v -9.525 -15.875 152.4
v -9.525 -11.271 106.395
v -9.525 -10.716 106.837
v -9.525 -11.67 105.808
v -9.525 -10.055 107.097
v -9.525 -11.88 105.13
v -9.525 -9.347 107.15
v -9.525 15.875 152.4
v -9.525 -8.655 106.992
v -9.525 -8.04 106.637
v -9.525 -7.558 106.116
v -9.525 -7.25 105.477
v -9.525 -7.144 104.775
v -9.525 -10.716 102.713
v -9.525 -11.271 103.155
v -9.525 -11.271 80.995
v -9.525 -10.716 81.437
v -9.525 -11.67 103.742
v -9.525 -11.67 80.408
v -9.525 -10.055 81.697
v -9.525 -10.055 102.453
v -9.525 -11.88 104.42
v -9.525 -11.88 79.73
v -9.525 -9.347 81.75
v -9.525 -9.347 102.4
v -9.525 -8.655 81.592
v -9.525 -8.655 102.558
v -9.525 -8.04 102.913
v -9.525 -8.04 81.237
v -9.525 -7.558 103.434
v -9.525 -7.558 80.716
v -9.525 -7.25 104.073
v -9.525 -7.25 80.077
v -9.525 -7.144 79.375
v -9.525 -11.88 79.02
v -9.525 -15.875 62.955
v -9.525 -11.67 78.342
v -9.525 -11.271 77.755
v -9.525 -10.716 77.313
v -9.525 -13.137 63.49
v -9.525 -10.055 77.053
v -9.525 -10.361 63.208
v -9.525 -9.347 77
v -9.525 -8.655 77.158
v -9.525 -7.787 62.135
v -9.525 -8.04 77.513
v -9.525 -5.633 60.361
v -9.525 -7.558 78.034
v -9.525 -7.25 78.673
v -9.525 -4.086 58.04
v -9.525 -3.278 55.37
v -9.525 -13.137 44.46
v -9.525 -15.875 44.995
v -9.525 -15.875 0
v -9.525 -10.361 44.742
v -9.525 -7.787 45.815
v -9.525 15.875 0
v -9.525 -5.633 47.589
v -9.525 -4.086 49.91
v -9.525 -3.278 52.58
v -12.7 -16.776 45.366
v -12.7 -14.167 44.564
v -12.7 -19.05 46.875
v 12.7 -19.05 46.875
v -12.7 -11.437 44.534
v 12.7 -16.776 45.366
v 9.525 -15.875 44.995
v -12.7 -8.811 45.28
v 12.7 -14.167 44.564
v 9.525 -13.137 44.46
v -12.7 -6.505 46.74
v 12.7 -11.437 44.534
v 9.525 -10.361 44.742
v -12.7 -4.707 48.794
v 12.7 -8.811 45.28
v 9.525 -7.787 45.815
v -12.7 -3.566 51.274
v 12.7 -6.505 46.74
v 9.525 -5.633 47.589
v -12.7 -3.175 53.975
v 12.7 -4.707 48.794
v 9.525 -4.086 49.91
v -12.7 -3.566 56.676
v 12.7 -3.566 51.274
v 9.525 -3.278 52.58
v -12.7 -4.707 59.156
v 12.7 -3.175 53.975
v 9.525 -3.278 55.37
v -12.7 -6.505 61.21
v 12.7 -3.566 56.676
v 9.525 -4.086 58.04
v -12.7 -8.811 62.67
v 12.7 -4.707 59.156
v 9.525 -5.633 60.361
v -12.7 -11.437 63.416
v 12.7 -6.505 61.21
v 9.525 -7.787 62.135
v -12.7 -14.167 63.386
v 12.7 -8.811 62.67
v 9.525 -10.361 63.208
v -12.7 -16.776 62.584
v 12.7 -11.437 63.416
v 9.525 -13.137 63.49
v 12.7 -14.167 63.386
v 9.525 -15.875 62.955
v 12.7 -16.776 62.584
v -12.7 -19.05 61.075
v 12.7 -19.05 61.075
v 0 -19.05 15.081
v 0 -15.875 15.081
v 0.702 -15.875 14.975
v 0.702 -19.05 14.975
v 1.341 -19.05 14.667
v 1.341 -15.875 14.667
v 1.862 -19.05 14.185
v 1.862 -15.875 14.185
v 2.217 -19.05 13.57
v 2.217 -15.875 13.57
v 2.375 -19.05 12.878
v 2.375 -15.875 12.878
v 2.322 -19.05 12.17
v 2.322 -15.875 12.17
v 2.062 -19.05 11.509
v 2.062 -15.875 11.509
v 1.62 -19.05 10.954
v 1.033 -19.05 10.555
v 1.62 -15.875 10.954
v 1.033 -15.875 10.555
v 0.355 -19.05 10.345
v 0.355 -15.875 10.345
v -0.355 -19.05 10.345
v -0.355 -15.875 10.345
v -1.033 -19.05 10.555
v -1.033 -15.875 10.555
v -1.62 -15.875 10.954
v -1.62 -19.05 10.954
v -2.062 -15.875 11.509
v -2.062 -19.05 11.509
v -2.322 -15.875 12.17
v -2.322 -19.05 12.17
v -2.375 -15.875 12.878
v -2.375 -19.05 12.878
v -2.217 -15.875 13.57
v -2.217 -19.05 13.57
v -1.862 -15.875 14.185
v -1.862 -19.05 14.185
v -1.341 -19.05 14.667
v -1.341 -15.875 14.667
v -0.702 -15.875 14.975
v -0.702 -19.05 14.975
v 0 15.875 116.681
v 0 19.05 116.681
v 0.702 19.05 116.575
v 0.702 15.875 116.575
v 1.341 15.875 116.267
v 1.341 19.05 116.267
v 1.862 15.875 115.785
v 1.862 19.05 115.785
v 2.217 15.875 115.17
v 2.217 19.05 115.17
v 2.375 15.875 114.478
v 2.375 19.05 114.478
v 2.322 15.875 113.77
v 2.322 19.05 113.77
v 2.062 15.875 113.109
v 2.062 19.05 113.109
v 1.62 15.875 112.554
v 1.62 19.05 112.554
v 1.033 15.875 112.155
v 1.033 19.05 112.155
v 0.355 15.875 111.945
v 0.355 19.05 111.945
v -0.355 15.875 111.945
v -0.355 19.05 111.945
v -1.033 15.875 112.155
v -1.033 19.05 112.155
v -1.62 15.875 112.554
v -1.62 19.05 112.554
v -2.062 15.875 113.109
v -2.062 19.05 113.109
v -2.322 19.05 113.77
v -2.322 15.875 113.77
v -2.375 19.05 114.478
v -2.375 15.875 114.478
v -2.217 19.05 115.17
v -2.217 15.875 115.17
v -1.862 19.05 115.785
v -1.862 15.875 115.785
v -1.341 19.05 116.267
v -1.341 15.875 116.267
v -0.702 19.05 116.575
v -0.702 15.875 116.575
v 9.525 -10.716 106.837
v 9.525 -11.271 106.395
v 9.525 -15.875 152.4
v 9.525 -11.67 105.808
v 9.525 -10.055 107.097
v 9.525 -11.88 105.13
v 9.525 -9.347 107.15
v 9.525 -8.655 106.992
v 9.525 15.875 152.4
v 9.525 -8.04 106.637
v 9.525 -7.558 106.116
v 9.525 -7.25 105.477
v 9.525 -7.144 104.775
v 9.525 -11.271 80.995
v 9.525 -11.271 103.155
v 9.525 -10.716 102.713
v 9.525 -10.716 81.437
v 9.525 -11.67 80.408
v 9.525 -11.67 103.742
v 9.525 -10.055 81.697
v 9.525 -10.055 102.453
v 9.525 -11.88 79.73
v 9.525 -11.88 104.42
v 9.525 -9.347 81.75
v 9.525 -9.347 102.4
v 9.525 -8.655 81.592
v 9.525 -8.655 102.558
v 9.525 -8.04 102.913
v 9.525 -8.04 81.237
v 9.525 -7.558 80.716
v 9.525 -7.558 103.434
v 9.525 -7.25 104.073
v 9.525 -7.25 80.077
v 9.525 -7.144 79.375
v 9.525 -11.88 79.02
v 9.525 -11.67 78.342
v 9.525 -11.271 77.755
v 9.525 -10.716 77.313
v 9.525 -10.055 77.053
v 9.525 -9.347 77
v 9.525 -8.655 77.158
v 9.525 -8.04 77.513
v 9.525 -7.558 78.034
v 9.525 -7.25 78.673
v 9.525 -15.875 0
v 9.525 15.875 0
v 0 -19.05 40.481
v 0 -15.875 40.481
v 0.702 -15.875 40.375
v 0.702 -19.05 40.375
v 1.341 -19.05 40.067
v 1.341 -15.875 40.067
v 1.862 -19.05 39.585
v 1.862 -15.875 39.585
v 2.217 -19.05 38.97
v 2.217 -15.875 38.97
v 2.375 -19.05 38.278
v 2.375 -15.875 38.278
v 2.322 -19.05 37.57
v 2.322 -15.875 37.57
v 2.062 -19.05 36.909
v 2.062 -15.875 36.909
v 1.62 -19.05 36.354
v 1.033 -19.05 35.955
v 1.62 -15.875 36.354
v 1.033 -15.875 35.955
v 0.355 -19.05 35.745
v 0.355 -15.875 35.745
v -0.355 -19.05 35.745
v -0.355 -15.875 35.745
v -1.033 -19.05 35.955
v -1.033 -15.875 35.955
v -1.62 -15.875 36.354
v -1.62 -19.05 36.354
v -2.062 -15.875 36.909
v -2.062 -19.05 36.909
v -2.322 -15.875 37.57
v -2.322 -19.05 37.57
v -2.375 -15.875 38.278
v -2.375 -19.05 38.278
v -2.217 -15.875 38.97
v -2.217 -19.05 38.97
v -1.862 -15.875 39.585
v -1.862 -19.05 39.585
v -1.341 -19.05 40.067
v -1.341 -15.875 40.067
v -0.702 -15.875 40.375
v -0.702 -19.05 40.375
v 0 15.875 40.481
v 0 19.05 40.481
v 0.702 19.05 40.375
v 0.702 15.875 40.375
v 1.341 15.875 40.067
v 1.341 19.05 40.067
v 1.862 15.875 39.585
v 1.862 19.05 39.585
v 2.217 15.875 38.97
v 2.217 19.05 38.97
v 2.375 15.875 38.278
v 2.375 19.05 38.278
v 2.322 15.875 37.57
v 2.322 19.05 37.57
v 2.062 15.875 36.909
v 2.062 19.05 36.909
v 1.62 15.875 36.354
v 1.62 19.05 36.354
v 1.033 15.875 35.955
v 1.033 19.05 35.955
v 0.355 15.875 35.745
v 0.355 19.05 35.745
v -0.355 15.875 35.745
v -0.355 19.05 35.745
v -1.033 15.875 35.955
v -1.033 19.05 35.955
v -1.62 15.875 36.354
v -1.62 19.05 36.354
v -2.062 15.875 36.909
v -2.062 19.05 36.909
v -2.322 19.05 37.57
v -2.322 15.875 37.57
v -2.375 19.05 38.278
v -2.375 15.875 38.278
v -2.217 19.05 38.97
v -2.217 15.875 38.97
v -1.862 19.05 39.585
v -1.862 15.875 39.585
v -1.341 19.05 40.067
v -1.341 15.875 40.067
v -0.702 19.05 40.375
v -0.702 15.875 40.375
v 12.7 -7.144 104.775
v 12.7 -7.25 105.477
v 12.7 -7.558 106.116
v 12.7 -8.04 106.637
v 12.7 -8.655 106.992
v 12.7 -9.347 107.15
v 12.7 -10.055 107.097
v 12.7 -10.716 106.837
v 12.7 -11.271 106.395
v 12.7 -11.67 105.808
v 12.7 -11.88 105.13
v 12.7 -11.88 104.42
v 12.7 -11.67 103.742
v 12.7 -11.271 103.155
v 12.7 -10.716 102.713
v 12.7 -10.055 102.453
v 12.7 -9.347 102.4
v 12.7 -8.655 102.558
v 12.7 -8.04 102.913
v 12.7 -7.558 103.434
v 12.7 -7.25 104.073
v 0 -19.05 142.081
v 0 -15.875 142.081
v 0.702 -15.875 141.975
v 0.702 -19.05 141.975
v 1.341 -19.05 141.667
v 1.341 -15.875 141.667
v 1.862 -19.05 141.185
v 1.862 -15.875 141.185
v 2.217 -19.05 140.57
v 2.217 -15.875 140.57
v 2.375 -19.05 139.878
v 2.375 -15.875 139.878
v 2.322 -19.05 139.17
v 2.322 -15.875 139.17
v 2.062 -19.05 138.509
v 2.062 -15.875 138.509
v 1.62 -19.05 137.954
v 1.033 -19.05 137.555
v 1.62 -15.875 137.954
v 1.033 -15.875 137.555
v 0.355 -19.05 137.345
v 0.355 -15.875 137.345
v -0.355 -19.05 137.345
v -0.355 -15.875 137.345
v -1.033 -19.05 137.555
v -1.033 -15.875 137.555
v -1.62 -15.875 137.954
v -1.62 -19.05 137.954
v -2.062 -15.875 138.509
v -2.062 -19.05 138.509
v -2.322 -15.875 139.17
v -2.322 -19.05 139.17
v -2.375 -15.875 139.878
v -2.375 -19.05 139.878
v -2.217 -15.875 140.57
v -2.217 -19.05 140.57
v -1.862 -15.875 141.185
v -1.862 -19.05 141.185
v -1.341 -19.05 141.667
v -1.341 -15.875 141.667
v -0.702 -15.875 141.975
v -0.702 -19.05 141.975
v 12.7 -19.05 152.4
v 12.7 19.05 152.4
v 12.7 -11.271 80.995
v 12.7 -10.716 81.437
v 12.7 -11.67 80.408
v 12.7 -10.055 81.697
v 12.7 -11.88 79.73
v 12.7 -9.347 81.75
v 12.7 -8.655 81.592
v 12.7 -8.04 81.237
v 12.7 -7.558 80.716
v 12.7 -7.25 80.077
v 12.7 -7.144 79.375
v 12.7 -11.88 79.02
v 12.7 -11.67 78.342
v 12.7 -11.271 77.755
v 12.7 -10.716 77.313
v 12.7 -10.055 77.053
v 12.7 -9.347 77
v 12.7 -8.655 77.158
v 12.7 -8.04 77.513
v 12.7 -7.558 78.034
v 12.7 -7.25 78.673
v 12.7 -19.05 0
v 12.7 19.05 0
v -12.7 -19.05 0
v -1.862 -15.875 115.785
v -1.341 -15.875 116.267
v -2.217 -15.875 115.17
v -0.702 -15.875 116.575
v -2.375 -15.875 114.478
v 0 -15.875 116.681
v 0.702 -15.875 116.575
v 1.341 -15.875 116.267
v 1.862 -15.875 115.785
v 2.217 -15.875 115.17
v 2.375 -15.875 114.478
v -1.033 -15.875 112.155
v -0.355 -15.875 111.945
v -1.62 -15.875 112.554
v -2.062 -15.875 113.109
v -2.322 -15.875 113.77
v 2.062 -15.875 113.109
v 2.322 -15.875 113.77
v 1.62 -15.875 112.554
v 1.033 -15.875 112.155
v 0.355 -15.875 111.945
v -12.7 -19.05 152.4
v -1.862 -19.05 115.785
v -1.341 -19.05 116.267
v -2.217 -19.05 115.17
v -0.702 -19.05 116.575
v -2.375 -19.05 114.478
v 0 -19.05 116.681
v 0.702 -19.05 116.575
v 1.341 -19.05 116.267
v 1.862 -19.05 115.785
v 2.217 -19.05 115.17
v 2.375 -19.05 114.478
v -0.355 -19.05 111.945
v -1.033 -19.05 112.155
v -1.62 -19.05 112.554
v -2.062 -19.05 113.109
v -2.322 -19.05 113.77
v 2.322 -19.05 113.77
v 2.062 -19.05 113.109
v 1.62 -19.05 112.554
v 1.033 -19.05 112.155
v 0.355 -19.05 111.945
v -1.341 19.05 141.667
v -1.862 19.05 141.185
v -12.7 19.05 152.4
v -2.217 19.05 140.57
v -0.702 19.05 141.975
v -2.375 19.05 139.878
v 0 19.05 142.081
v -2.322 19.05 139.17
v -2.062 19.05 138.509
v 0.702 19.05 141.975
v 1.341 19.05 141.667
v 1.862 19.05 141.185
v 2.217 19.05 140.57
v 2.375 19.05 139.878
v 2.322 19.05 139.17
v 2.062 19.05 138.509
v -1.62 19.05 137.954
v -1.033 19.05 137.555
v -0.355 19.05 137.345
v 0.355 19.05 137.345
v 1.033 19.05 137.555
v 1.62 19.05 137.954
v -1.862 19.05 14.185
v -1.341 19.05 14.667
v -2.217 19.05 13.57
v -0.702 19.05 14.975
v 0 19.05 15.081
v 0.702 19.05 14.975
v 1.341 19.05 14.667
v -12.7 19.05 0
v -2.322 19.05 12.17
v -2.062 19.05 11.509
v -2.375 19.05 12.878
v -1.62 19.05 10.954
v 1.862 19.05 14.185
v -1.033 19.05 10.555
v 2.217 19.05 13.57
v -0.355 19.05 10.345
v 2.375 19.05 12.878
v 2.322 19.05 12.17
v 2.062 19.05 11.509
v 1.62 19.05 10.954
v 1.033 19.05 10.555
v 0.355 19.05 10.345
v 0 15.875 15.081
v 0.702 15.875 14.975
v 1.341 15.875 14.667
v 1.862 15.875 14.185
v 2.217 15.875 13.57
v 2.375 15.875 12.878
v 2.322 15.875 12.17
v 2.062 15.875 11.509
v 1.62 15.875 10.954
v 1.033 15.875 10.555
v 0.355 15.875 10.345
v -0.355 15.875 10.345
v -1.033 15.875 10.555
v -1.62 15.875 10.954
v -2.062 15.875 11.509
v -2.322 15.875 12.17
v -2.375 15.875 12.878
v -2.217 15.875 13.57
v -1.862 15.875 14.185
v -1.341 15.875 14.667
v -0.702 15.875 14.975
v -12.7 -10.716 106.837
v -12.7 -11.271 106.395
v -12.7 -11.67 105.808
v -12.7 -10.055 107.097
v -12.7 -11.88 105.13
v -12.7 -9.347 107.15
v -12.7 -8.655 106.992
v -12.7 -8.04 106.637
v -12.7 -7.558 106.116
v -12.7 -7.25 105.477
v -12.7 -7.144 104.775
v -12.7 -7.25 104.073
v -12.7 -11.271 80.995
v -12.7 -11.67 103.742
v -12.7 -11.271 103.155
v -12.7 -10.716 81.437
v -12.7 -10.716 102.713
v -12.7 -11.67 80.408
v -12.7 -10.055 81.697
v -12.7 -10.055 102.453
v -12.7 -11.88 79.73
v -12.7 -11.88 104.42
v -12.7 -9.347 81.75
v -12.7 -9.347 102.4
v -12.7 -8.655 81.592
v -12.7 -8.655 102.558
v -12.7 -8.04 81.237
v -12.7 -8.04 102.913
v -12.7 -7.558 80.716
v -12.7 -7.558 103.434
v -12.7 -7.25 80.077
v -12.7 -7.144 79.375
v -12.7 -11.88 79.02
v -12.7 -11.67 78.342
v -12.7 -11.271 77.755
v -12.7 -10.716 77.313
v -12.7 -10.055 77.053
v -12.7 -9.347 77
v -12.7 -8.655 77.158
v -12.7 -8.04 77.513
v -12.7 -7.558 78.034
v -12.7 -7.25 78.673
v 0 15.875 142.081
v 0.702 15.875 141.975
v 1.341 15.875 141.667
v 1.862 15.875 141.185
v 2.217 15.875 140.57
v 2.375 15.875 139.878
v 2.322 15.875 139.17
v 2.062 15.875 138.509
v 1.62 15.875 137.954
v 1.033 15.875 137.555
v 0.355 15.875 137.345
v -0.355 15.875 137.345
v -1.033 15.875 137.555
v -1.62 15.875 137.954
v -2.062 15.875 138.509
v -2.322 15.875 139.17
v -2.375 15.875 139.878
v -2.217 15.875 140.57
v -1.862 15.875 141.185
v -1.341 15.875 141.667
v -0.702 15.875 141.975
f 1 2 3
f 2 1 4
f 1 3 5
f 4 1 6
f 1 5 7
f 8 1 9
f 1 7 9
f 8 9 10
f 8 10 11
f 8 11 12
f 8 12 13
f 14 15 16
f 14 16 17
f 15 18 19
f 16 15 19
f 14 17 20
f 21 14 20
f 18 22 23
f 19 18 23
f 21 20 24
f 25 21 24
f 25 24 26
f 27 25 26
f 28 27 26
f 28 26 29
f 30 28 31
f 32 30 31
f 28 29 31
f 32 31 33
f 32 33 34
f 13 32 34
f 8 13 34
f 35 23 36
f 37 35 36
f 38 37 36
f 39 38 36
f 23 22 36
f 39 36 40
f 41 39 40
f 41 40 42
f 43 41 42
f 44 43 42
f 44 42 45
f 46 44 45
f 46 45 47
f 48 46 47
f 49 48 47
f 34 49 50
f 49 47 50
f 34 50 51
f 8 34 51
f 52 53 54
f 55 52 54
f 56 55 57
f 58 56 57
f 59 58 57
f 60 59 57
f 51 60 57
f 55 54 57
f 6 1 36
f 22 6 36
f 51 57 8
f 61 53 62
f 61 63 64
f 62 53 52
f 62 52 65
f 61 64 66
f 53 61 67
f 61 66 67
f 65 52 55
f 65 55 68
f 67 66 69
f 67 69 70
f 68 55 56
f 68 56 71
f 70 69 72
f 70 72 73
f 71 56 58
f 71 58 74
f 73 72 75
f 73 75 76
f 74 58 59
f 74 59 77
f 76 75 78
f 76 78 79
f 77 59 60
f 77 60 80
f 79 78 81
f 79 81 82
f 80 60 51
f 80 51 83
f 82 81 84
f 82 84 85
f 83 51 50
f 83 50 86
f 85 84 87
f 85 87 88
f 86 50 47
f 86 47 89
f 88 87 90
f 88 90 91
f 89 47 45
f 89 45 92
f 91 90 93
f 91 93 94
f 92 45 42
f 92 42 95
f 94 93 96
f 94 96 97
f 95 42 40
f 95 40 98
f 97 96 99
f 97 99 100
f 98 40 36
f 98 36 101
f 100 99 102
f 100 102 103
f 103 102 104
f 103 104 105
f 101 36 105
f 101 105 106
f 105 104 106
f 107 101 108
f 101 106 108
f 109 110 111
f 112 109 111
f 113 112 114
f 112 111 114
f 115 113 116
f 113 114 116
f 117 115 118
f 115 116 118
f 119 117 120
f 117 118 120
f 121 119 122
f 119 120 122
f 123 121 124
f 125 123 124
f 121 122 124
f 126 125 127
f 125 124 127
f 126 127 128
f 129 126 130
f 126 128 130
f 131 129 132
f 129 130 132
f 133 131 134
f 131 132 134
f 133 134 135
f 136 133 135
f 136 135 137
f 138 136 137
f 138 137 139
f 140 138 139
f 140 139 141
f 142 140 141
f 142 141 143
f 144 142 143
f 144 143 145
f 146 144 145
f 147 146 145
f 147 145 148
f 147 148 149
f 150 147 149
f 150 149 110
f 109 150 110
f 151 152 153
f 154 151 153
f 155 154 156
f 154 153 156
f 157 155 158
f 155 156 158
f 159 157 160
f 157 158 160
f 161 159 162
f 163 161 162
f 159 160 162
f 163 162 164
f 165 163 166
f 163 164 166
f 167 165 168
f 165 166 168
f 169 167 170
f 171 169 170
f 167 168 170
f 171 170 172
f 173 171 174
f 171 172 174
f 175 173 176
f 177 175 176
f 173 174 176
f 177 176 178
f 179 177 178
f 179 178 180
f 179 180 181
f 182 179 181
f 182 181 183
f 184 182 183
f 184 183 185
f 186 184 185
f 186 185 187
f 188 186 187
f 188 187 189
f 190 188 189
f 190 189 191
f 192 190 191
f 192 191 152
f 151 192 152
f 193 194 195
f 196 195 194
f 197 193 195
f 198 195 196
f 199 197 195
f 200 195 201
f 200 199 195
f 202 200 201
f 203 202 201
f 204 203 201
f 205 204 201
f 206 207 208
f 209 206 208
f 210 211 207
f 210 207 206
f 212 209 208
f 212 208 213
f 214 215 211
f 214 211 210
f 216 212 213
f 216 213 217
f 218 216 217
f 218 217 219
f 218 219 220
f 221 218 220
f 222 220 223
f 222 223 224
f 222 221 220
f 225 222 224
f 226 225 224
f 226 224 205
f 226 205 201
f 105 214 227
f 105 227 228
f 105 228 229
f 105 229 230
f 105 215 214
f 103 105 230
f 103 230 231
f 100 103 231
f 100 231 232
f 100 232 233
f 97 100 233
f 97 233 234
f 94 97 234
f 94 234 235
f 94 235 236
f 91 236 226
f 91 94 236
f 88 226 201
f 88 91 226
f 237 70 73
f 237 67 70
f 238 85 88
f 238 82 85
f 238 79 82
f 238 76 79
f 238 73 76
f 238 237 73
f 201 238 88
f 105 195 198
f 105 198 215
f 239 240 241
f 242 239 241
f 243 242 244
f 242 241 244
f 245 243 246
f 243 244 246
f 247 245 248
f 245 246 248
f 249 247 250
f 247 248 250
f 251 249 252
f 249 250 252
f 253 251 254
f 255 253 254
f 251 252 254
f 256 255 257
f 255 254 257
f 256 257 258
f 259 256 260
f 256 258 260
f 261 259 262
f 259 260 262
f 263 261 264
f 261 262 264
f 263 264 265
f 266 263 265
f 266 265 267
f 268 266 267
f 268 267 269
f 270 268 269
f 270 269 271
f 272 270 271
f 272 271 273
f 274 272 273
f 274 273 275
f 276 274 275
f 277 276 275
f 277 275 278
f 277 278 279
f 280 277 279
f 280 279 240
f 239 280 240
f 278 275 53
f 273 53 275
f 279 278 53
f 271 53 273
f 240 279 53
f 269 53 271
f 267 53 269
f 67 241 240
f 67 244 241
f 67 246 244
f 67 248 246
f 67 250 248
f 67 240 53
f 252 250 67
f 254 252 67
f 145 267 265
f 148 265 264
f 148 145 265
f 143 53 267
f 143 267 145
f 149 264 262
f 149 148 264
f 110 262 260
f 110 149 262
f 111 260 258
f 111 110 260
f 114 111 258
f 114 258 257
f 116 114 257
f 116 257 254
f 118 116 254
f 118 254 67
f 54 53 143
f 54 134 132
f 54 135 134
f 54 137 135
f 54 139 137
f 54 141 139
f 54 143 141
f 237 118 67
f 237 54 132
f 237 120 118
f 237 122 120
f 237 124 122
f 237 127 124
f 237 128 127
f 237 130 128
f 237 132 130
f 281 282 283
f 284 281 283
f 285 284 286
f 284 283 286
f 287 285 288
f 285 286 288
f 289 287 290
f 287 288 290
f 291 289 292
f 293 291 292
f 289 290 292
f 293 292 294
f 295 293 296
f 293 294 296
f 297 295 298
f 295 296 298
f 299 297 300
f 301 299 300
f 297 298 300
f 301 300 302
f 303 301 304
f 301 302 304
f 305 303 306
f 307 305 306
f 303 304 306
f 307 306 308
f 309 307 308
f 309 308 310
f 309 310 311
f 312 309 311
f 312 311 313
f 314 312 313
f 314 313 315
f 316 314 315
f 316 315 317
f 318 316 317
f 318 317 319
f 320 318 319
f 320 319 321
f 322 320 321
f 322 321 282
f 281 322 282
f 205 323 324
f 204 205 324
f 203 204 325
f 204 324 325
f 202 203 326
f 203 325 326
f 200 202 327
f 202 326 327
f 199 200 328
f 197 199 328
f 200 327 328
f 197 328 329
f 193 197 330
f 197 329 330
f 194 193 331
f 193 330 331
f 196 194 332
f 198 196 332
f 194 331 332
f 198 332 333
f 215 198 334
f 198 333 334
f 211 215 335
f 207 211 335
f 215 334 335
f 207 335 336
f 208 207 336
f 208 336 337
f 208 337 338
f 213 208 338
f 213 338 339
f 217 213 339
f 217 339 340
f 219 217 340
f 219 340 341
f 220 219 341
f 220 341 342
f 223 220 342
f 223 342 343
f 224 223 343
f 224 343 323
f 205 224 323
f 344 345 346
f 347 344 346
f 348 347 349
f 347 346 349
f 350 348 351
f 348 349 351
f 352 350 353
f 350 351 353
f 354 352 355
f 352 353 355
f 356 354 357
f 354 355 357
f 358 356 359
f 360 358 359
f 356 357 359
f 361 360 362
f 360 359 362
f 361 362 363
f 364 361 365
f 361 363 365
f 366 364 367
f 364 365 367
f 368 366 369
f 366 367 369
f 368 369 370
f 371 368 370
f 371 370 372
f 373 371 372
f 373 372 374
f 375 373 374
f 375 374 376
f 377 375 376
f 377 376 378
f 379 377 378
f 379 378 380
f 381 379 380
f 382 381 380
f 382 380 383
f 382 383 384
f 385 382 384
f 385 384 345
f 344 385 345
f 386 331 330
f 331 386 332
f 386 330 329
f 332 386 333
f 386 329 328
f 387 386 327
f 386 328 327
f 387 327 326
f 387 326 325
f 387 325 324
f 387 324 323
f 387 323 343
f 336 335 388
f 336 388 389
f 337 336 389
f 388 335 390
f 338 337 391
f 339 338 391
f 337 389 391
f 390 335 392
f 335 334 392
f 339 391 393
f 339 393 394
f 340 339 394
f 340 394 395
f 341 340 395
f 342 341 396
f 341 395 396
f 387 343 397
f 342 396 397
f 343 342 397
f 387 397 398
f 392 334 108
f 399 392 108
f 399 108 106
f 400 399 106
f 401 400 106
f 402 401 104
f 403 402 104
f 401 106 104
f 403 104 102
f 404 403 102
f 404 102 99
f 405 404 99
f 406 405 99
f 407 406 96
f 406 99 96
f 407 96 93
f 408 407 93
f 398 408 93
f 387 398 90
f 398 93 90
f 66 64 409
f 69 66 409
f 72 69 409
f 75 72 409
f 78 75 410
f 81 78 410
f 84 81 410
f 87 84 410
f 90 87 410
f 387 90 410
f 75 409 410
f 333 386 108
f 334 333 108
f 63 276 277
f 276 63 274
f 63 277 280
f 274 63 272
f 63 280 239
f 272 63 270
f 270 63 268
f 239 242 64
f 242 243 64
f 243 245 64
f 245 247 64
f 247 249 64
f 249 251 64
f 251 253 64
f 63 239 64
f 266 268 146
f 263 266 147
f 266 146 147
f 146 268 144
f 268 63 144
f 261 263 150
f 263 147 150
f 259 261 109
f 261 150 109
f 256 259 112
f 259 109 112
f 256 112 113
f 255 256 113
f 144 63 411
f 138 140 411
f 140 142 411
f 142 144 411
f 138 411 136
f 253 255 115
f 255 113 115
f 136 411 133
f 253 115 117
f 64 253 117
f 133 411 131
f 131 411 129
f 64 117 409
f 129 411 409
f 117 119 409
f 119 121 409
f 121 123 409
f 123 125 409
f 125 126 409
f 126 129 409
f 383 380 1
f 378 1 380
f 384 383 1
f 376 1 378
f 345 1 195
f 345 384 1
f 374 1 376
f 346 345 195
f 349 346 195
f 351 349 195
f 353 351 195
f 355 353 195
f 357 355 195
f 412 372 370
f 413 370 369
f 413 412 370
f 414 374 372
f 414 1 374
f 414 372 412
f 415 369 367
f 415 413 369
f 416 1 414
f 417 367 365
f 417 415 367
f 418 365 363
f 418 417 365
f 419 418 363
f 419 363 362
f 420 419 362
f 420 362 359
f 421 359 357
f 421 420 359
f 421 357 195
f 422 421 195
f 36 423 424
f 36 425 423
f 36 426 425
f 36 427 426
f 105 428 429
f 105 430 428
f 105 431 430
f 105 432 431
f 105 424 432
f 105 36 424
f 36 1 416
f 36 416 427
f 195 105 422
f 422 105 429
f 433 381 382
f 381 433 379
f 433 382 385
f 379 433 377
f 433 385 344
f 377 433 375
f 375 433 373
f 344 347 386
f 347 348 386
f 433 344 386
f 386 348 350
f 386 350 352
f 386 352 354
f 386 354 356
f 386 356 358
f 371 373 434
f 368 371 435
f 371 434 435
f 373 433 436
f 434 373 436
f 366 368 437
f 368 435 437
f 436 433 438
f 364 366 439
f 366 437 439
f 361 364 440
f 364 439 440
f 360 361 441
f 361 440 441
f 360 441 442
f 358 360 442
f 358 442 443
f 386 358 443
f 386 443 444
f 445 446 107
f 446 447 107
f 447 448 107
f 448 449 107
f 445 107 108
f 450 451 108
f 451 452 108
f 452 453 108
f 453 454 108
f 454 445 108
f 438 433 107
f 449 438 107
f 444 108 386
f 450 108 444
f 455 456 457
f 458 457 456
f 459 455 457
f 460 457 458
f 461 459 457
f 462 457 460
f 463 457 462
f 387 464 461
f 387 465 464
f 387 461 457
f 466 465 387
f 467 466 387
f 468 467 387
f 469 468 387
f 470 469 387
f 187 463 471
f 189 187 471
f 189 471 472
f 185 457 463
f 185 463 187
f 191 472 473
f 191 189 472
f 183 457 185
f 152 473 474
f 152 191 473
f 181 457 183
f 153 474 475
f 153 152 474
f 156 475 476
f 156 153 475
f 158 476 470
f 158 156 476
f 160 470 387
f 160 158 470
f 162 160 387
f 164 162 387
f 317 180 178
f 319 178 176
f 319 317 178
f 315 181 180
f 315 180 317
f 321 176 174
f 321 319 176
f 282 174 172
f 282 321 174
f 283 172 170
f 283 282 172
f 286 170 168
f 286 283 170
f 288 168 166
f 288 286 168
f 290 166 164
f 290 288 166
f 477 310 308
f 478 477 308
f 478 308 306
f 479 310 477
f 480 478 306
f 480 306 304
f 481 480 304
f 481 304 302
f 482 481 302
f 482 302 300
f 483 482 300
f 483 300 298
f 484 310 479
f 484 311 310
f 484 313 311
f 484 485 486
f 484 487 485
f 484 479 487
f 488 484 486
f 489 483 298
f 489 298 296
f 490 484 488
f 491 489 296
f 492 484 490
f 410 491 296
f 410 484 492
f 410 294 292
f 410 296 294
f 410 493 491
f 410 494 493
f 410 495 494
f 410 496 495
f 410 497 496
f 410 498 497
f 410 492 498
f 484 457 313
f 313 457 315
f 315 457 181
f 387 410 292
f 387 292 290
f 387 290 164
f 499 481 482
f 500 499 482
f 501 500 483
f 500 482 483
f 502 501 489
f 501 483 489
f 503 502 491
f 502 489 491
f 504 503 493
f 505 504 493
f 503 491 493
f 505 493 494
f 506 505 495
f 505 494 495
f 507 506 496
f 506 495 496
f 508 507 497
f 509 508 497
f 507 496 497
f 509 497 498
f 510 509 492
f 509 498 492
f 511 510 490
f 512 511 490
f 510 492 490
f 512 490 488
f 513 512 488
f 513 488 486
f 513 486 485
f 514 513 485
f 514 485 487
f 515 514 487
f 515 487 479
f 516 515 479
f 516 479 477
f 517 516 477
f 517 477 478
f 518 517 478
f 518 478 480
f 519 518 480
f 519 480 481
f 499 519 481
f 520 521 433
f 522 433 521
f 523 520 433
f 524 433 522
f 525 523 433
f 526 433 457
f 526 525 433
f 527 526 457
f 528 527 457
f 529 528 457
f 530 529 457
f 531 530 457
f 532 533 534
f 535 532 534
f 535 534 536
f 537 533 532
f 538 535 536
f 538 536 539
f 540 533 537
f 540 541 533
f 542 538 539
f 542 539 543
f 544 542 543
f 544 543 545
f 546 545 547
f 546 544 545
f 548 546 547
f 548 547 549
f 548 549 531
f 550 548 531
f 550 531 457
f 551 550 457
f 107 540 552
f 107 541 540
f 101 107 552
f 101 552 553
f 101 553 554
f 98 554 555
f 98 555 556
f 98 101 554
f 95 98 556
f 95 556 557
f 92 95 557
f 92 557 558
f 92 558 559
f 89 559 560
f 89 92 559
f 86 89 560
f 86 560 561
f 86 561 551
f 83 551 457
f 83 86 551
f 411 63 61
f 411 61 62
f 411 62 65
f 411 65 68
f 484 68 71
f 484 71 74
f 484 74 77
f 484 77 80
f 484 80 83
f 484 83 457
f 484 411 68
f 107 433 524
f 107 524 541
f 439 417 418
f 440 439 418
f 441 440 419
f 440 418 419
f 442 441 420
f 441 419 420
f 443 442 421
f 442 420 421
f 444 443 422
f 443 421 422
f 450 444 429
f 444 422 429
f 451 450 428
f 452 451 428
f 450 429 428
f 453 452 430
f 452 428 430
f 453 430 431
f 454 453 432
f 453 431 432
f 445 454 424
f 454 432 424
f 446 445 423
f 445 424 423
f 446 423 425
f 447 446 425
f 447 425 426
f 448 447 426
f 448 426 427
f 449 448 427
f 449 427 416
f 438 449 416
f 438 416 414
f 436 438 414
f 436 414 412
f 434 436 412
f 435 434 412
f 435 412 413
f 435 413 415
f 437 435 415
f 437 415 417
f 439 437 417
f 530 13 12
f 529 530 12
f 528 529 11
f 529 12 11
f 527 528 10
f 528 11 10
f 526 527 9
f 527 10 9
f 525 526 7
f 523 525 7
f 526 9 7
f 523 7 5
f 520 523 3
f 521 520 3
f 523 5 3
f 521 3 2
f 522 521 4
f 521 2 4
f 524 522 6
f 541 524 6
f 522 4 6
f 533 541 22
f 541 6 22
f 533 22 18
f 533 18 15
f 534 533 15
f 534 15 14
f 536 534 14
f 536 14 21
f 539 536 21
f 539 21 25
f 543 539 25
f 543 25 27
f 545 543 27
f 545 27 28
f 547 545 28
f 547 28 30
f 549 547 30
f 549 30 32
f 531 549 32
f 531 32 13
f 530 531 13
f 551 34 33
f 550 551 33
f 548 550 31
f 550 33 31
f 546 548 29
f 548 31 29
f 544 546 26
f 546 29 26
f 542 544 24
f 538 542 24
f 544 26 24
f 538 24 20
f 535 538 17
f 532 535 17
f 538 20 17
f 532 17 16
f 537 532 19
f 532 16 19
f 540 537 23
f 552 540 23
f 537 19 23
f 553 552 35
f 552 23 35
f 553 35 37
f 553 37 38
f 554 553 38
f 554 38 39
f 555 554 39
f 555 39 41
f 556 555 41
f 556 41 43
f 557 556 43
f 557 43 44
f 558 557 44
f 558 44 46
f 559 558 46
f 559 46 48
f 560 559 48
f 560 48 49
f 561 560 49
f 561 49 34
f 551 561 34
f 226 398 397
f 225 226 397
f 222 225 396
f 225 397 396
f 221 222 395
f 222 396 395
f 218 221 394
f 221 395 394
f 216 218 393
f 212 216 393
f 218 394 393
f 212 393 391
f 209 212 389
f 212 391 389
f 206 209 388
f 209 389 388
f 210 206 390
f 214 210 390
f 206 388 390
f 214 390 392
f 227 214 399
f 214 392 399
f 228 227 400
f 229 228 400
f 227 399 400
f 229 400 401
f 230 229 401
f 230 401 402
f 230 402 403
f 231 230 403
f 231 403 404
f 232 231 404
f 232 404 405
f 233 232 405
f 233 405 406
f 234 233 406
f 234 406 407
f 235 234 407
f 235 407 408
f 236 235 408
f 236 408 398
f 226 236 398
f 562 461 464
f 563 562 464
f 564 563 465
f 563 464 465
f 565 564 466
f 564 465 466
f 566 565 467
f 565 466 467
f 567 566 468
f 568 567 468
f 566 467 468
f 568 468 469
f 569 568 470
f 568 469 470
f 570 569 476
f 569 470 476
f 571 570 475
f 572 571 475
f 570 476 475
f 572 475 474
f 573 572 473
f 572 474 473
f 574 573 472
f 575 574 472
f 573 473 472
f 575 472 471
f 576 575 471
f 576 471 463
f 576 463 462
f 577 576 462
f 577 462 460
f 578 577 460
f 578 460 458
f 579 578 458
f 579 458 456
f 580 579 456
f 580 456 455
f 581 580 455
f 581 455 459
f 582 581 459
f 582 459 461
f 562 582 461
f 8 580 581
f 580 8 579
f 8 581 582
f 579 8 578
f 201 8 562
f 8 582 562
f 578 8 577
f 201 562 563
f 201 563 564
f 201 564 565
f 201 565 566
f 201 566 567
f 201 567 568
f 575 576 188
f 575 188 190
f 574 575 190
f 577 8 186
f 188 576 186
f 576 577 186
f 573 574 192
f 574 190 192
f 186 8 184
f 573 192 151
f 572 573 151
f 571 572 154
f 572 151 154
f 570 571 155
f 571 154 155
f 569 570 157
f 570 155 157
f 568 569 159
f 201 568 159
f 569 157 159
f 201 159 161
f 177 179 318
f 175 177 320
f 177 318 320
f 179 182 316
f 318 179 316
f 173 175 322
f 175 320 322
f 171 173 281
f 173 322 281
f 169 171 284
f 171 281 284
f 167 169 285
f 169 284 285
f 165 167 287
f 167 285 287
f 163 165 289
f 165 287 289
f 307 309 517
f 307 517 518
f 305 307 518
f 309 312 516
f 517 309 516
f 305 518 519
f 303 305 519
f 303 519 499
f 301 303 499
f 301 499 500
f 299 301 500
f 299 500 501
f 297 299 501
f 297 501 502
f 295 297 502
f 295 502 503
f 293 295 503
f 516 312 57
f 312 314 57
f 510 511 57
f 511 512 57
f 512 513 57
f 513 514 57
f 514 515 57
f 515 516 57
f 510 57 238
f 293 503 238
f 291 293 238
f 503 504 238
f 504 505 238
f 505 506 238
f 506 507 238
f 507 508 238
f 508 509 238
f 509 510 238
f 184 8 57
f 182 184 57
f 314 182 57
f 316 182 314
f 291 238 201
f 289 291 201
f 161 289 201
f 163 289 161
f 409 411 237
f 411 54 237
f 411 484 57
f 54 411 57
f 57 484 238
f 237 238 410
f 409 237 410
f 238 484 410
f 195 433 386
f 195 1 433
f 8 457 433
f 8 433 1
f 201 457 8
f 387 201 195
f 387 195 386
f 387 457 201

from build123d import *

# Parameters (mm, degrees)
SKETCH1_W           = 25.4
SKETCH1_H           = 38.1
BOSS_EXTRUDE1_DEPTH = 152.4
SHELL1_T            = -3.175
SKETCH2_R           = 9.525
CUT_EXTRUDE1_DEPTH  = 156.672163536
SKETCH3_R           = 2.38125
CUT_EXTRUDE2_DEPTH  = 158.602855304
SKETCH4_R           = 2.38125
CUT_EXTRUDE3_DEPTH  = 156.672163536
SKETCH5_R           = 2.38125
CUT_EXTRUDE4_DEPTH  = 158.602855304


with BuildPart() as part:
    # Sketch1 → Boss-Extrude1 (new body)
    with BuildSketch(Plane.XY):
        Rectangle(SKETCH1_W, SKETCH1_H)
    extrude(amount=BOSS_EXTRUDE1_DEPTH)

    # Shell1
    shell1_openings = [part.faces().sort_by_distance(p)[0] for p in [
        (0, 0, 152.4),
        (0, 0, 0),
    ]]
    offset(amount=SHELL1_T, openings=shell1_openings, kind=Kind.INTERSECTION)

    # Sketch2 → Cut-Extrude1 (cut, through all)
    with BuildSketch(Plane(origin=(12.7, 0, 0), x_dir=(0, 0, -1), z_dir=(1, 0, 0))):
        with Locations((-53.975, -12.7)):
            Circle(SKETCH2_R)
    extrude(amount=-CUT_EXTRUDE1_DEPTH, mode=Mode.SUBTRACT)

    # Sketch3 → Cut-Extrude2 (cut, through all)
    with BuildSketch(Plane(origin=(0, 19.05, 0), x_dir=(1, 0, 0), z_dir=(0, 1, 0))):
        with Locations(Location((0, -139.7, 0), (0, 0, 270))):
            Circle(SKETCH3_R)
        with Locations(Location((0, -114.3, 0), (0, 0, 270))):
            Circle(SKETCH3_R)
    extrude(amount=-CUT_EXTRUDE2_DEPTH, mode=Mode.SUBTRACT)

    # Sketch4 → Cut-Extrude3 (cut, through all)
    with BuildSketch(Plane(origin=(12.7, 0, 0), x_dir=(0, 0, -1), z_dir=(1, 0, 0))):
        with Locations(Location((-79.375, -9.525, 0), (0, 0, 90))):
            Circle(SKETCH4_R)
        with Locations(Location((-104.775, -9.525, 0), (0, 0, 90))):
            Circle(SKETCH4_R)
    extrude(amount=-CUT_EXTRUDE3_DEPTH, mode=Mode.SUBTRACT)

    # Sketch5 → Cut-Extrude4 (cut, through all)
    with BuildSketch(Plane(origin=(0, 19.05, 0), x_dir=(1, 0, 0), z_dir=(0, 1, 0))):
        with Locations(Location((0, -12.7, 0), (0, 0, 270))):
            Circle(SKETCH5_R)
        with Locations(Location((0, -38.1, 0), (0, 0, 270))):
            Circle(SKETCH5_R)
    extrude(amount=-CUT_EXTRUDE4_DEPTH, mode=Mode.SUBTRACT)


solid = part.part
